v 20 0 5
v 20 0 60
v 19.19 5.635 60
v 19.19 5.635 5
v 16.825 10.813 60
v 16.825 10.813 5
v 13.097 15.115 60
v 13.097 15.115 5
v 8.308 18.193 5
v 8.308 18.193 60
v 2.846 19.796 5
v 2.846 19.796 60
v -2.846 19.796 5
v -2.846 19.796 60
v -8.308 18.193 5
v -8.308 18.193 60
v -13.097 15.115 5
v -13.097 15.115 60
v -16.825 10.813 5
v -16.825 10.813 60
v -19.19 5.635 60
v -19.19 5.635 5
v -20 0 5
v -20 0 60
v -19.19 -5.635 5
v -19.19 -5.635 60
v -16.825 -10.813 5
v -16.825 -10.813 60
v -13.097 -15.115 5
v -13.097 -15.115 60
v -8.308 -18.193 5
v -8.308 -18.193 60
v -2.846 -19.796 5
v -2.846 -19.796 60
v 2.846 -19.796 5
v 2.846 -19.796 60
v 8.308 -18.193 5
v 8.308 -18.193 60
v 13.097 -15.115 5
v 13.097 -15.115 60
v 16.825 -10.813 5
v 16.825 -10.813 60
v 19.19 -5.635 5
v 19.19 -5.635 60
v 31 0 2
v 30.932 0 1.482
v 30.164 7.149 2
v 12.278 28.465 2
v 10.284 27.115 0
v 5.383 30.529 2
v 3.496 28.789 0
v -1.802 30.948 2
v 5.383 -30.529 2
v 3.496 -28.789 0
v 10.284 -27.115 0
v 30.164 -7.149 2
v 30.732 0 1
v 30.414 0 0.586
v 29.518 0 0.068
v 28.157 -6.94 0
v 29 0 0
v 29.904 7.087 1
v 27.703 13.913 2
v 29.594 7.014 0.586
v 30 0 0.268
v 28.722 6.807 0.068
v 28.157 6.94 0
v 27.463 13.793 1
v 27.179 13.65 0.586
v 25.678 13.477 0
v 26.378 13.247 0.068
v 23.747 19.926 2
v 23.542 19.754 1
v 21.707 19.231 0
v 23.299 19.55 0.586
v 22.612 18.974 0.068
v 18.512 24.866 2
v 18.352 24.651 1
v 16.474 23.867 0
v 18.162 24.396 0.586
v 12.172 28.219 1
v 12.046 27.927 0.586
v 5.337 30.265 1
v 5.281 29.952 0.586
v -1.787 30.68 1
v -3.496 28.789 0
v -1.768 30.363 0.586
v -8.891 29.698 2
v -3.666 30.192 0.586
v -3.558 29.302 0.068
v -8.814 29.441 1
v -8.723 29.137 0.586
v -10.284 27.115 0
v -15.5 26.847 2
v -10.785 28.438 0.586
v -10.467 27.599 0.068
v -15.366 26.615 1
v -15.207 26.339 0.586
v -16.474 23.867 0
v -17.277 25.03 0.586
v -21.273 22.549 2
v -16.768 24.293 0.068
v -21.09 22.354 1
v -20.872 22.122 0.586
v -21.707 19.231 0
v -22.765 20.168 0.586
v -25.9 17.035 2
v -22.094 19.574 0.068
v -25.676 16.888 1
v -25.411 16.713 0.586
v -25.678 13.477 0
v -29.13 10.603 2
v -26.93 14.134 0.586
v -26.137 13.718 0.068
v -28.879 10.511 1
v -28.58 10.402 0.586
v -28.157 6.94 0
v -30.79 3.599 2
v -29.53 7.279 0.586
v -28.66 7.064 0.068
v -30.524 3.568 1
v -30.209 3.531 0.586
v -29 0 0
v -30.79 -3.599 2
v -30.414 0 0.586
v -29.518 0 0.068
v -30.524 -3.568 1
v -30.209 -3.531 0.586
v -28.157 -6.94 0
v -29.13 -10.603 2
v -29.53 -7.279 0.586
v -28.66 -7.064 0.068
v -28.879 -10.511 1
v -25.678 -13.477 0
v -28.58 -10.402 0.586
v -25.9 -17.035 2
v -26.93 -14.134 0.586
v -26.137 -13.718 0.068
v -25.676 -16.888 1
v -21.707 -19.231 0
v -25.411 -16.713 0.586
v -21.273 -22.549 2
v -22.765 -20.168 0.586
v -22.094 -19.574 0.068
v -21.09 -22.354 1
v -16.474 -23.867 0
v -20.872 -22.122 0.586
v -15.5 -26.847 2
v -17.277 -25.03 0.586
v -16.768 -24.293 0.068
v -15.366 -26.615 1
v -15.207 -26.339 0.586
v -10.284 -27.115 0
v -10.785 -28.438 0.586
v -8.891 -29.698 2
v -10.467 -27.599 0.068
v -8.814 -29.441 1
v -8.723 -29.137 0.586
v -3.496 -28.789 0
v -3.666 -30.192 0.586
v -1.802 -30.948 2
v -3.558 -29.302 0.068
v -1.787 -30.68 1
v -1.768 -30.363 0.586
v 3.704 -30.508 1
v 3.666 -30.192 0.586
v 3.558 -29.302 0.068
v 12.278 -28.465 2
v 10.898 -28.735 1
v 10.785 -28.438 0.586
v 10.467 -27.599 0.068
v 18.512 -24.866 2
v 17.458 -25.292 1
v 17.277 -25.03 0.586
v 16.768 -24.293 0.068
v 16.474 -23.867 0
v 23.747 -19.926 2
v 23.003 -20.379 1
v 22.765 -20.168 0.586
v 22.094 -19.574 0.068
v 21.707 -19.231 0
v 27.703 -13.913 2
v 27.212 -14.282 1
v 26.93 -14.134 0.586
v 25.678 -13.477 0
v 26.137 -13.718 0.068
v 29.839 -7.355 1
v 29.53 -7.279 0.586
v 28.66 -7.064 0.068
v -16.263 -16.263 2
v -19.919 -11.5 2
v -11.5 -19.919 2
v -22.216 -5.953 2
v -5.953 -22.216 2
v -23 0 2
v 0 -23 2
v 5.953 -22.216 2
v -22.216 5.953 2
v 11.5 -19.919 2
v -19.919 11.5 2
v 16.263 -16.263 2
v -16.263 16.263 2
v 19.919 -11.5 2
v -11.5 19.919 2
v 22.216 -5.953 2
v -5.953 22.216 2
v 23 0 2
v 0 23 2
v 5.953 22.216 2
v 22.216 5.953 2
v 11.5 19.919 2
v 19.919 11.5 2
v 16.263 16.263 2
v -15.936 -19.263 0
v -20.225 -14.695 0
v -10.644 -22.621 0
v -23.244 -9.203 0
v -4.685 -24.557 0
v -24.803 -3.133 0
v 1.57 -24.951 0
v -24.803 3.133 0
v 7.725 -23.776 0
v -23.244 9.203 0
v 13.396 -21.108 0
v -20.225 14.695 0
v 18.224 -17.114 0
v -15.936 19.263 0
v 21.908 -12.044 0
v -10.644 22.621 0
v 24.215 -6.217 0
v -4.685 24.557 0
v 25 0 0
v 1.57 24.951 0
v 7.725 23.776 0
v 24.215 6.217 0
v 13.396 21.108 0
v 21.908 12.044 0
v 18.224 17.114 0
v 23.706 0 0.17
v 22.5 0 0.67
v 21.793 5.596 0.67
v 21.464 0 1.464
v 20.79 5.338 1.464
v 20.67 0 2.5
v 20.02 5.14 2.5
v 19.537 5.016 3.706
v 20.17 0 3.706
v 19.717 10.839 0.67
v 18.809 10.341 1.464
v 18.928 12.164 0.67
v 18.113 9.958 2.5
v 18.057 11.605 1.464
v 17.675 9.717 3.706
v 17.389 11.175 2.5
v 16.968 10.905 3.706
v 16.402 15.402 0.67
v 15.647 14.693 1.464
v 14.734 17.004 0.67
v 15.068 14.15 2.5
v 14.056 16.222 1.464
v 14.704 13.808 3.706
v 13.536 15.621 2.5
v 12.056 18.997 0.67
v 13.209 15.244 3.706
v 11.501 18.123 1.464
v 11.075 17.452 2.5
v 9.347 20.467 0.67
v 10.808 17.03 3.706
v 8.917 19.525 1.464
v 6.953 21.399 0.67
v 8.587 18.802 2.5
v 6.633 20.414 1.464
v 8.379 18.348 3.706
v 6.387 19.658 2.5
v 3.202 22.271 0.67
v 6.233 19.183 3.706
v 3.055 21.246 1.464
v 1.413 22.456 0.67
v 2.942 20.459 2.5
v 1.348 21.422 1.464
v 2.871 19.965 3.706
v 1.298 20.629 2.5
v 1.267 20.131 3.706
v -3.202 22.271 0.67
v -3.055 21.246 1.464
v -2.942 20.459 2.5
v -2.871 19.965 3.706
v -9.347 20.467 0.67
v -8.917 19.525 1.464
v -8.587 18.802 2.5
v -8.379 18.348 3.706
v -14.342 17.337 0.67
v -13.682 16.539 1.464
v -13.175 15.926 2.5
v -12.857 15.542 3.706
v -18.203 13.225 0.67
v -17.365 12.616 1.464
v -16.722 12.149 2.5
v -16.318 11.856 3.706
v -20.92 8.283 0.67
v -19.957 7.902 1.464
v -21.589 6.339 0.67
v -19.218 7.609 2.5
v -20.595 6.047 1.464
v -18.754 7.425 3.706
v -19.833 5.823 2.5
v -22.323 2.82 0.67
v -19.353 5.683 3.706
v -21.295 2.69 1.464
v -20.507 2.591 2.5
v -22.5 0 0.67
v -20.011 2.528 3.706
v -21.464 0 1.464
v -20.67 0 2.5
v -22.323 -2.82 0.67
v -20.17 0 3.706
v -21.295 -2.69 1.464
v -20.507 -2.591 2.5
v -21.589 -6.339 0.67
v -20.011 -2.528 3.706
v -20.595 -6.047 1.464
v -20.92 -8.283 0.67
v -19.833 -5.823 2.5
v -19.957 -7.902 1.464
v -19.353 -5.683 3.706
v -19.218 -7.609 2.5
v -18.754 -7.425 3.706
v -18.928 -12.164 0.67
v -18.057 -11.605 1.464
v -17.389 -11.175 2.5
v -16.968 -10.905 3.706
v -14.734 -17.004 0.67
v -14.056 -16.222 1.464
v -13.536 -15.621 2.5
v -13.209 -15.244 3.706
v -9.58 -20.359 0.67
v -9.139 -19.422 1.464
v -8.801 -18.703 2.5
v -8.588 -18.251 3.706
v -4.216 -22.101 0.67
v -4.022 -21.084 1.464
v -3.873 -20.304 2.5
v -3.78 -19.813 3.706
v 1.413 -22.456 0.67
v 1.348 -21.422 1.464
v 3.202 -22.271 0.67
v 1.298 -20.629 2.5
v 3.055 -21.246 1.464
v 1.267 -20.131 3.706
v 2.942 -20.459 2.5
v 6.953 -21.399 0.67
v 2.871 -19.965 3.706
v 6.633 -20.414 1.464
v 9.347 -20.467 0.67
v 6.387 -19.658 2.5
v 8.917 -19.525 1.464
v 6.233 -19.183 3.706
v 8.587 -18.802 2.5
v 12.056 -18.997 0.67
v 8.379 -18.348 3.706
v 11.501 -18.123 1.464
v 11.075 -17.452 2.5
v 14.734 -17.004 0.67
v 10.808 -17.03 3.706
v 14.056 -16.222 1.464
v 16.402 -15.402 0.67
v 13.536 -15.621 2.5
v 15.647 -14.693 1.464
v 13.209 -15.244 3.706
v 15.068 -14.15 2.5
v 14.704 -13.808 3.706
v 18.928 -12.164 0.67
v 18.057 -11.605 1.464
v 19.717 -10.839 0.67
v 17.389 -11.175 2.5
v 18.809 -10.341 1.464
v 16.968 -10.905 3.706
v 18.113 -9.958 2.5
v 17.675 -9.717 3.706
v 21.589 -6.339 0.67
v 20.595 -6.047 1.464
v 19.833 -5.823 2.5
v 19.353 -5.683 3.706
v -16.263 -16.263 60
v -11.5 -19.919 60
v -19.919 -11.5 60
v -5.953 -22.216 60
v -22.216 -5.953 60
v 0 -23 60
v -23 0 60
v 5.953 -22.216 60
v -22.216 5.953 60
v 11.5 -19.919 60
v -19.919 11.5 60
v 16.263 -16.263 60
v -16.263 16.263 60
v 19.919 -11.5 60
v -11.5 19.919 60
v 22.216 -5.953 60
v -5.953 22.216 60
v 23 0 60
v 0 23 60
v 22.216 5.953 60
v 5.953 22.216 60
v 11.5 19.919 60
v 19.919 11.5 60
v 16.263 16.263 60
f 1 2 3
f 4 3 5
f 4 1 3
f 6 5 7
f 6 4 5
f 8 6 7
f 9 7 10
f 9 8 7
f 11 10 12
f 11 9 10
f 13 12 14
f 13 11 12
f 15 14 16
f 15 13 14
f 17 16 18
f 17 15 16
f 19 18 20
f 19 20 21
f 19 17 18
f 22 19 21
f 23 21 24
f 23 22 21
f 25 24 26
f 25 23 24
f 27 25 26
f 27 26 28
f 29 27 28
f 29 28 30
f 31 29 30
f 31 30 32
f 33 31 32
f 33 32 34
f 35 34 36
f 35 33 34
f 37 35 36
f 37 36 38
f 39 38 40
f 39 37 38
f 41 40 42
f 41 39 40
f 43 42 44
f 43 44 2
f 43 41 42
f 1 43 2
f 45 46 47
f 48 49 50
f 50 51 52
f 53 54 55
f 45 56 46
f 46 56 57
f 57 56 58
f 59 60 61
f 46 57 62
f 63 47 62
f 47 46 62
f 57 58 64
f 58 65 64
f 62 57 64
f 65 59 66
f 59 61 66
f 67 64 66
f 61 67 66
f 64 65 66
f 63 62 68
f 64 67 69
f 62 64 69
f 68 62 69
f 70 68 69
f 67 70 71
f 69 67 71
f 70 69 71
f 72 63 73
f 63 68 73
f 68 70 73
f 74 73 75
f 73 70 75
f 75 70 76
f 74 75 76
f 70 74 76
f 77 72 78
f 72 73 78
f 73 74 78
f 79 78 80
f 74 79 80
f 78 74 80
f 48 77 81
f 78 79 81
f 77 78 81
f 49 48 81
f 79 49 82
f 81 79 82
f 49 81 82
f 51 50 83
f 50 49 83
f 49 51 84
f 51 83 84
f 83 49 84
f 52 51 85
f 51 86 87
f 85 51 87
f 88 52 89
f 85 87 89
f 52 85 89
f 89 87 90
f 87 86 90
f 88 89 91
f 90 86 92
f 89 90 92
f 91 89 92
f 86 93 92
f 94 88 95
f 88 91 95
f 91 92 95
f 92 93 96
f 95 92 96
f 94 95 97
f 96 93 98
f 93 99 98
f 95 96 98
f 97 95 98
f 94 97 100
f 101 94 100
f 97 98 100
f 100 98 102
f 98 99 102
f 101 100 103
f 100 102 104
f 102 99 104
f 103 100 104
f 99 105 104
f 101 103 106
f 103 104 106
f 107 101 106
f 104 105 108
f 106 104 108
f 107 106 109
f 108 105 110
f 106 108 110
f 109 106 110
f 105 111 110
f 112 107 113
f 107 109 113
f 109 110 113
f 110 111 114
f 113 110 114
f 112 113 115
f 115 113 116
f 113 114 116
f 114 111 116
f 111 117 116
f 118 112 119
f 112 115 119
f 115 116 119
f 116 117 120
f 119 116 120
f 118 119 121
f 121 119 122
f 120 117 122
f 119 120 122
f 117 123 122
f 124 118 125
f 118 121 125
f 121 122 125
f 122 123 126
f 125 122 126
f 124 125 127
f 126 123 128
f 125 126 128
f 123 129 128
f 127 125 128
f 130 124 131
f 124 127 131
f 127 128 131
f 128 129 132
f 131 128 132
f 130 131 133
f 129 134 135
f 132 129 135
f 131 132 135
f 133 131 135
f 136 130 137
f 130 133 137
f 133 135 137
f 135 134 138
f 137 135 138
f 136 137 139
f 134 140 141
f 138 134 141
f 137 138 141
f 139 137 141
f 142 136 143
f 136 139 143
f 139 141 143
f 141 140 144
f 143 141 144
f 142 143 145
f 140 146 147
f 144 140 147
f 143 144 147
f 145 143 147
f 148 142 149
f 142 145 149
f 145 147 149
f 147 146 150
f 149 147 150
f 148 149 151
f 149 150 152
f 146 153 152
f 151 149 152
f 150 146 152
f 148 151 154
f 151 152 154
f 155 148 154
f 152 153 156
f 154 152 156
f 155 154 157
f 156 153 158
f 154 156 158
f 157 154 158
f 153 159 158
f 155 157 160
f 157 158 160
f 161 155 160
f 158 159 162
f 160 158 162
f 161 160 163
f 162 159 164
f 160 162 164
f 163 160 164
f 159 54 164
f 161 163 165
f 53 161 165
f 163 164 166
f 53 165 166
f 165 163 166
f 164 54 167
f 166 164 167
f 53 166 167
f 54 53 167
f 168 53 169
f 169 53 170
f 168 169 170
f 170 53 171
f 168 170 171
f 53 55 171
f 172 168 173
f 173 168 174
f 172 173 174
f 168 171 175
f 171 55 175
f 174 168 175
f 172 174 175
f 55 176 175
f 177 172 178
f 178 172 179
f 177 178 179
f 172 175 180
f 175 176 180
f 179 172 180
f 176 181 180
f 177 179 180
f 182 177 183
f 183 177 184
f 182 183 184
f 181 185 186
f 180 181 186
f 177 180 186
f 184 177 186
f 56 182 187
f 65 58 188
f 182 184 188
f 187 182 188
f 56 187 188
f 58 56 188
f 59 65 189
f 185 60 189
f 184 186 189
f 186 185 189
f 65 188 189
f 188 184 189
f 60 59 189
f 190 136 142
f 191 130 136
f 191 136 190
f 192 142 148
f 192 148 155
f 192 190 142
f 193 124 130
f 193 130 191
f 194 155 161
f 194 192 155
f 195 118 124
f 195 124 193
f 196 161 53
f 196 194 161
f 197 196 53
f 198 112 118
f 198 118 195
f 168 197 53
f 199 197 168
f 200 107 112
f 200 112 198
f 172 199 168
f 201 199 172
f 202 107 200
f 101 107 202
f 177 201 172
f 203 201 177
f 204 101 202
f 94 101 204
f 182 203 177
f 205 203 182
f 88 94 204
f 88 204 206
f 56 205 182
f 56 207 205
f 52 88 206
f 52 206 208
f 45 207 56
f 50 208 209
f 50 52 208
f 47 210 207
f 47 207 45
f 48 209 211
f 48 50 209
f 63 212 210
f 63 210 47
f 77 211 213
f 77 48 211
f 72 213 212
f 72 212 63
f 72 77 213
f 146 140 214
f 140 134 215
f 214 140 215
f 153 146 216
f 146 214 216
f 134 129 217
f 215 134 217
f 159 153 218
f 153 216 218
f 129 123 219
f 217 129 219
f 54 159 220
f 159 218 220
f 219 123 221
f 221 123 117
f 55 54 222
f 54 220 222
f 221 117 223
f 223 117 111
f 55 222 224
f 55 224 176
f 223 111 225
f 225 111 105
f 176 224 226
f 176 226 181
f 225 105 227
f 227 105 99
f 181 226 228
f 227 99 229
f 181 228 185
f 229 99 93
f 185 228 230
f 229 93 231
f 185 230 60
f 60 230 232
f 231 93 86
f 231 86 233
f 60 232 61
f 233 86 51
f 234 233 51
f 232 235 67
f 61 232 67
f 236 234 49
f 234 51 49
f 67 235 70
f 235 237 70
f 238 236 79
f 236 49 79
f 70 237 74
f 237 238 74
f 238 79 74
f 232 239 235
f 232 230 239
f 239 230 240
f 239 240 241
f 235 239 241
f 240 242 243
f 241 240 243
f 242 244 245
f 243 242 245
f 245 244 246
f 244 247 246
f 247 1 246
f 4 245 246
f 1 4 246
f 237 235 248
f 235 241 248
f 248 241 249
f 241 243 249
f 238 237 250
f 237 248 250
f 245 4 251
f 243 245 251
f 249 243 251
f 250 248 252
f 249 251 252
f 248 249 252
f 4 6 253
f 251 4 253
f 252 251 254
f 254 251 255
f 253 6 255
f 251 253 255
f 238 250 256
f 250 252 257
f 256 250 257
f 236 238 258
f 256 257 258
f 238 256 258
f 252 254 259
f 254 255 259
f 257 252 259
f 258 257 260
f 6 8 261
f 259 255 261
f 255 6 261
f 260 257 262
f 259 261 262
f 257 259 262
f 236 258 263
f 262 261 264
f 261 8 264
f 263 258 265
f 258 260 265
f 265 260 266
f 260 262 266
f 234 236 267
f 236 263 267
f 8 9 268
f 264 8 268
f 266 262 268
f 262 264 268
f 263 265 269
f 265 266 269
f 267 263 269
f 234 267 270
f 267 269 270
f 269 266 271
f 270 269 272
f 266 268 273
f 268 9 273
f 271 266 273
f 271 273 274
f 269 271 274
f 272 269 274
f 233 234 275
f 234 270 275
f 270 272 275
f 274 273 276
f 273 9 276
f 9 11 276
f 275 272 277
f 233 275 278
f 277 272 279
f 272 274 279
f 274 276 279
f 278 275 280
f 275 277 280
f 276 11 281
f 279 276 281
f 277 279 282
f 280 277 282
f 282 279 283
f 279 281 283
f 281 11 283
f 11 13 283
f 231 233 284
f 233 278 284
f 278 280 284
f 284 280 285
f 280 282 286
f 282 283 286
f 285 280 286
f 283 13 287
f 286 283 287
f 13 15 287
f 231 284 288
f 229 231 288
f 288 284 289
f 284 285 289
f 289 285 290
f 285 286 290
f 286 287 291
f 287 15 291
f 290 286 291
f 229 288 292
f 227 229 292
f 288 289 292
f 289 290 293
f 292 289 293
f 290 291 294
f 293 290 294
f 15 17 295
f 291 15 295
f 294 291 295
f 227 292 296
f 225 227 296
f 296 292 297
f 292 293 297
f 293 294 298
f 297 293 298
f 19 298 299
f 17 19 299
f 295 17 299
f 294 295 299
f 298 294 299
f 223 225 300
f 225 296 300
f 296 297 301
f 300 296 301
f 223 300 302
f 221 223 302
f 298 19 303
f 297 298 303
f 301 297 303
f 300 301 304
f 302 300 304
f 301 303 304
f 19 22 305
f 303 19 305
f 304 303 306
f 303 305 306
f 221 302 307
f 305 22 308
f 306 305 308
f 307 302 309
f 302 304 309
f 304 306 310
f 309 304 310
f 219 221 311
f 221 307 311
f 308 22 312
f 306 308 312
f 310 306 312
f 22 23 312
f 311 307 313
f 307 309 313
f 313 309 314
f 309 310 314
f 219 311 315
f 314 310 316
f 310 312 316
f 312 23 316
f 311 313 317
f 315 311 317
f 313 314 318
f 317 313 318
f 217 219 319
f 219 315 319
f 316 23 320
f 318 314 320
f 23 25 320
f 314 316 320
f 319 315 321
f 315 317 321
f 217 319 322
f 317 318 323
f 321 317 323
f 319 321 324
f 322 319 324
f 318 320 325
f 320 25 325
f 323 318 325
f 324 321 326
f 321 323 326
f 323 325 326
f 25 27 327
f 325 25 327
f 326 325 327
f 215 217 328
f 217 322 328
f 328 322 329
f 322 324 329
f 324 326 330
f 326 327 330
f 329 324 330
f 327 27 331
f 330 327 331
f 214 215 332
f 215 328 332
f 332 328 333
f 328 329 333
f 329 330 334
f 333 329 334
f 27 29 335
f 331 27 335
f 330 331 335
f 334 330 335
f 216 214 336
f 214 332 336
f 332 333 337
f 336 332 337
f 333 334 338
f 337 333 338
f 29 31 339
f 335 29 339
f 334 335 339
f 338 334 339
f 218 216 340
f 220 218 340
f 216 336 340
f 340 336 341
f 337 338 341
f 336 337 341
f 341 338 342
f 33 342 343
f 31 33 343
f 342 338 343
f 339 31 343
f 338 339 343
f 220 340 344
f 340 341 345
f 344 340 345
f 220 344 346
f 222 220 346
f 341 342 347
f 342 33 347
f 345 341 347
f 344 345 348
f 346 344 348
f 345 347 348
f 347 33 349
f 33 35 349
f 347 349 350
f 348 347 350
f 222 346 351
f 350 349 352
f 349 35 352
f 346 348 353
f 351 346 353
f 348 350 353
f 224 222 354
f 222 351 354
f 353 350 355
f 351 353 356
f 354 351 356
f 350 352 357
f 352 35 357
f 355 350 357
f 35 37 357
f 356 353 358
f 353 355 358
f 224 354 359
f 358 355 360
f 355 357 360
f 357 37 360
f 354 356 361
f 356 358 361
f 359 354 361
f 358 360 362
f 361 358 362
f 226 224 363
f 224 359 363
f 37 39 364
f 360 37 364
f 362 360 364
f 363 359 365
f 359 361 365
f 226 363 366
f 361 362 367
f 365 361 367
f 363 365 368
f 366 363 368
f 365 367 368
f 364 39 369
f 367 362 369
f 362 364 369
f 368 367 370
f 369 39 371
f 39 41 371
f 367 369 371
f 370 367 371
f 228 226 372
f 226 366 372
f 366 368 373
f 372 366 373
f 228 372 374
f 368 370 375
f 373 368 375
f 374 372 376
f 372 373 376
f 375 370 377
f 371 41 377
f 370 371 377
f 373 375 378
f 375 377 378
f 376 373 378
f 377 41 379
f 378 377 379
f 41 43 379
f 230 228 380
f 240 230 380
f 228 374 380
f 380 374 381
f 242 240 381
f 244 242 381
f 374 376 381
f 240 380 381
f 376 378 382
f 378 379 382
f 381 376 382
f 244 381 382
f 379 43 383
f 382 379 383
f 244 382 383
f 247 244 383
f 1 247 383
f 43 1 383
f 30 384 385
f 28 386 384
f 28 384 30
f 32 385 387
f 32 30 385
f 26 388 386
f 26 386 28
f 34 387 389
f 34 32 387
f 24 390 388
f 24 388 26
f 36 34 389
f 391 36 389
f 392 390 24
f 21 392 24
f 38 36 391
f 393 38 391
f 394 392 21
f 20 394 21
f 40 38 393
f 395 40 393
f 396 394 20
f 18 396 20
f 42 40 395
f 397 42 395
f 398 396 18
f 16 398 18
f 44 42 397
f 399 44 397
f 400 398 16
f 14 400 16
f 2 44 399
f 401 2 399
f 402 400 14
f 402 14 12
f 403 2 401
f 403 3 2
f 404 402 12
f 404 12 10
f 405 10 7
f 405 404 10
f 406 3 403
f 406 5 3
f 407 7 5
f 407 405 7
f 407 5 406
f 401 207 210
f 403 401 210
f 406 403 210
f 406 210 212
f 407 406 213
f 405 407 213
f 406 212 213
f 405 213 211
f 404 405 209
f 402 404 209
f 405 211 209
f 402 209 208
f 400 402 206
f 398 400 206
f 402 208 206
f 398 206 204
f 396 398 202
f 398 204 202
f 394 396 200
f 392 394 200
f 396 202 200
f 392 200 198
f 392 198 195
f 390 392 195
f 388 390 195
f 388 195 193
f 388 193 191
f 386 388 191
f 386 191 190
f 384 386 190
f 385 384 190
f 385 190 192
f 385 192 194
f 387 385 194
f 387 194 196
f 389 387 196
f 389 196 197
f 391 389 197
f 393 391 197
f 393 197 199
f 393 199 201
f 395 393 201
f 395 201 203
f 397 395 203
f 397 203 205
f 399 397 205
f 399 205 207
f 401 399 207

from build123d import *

# Parameters (mm, degrees)
F0_R     = 23
F0_R_2   = 20
F1_DEPTH = 60
F0_R_3   = 31
F2_DEPTH = 2
F3_R     = 1.99999
F4_R     = 5


# Not quite as in the source:
# - a fillet or chamfer is up to 0.001 mm smaller than in the source, because OpenCascade refuses the exact size


with BuildPart() as f1:
    # F0 (on Top) → F1 (new body)
    with BuildSketch(Plane.XY):
        Circle(F0_R)
        Circle(F0_R_2, mode=Mode.SUBTRACT)
    extrude(amount=F1_DEPTH)

    # F0 (on Top) → F2 (join)
    with BuildSketch(Plane.XY):
        Circle(F0_R_3)
        Circle(F0_R, mode=Mode.SUBTRACT)
    extrude(amount=F2_DEPTH)

    # F3 (radius 2 in the source; OpenCascade refuses exactly that, so slightly less here)
    f3_edges = [f1.edges().sort_by_distance(p)[0] for p in [
        (-31, 0, 0),
    ]]
    fillet(f3_edges, radius=F3_R)

    # F4
    f4_edges = [f1.edges().sort_by_distance(p)[0] for p in [
        (-20, 0, 0),
    ]]
    fillet(f4_edges, radius=F4_R)


solid = f1.part
